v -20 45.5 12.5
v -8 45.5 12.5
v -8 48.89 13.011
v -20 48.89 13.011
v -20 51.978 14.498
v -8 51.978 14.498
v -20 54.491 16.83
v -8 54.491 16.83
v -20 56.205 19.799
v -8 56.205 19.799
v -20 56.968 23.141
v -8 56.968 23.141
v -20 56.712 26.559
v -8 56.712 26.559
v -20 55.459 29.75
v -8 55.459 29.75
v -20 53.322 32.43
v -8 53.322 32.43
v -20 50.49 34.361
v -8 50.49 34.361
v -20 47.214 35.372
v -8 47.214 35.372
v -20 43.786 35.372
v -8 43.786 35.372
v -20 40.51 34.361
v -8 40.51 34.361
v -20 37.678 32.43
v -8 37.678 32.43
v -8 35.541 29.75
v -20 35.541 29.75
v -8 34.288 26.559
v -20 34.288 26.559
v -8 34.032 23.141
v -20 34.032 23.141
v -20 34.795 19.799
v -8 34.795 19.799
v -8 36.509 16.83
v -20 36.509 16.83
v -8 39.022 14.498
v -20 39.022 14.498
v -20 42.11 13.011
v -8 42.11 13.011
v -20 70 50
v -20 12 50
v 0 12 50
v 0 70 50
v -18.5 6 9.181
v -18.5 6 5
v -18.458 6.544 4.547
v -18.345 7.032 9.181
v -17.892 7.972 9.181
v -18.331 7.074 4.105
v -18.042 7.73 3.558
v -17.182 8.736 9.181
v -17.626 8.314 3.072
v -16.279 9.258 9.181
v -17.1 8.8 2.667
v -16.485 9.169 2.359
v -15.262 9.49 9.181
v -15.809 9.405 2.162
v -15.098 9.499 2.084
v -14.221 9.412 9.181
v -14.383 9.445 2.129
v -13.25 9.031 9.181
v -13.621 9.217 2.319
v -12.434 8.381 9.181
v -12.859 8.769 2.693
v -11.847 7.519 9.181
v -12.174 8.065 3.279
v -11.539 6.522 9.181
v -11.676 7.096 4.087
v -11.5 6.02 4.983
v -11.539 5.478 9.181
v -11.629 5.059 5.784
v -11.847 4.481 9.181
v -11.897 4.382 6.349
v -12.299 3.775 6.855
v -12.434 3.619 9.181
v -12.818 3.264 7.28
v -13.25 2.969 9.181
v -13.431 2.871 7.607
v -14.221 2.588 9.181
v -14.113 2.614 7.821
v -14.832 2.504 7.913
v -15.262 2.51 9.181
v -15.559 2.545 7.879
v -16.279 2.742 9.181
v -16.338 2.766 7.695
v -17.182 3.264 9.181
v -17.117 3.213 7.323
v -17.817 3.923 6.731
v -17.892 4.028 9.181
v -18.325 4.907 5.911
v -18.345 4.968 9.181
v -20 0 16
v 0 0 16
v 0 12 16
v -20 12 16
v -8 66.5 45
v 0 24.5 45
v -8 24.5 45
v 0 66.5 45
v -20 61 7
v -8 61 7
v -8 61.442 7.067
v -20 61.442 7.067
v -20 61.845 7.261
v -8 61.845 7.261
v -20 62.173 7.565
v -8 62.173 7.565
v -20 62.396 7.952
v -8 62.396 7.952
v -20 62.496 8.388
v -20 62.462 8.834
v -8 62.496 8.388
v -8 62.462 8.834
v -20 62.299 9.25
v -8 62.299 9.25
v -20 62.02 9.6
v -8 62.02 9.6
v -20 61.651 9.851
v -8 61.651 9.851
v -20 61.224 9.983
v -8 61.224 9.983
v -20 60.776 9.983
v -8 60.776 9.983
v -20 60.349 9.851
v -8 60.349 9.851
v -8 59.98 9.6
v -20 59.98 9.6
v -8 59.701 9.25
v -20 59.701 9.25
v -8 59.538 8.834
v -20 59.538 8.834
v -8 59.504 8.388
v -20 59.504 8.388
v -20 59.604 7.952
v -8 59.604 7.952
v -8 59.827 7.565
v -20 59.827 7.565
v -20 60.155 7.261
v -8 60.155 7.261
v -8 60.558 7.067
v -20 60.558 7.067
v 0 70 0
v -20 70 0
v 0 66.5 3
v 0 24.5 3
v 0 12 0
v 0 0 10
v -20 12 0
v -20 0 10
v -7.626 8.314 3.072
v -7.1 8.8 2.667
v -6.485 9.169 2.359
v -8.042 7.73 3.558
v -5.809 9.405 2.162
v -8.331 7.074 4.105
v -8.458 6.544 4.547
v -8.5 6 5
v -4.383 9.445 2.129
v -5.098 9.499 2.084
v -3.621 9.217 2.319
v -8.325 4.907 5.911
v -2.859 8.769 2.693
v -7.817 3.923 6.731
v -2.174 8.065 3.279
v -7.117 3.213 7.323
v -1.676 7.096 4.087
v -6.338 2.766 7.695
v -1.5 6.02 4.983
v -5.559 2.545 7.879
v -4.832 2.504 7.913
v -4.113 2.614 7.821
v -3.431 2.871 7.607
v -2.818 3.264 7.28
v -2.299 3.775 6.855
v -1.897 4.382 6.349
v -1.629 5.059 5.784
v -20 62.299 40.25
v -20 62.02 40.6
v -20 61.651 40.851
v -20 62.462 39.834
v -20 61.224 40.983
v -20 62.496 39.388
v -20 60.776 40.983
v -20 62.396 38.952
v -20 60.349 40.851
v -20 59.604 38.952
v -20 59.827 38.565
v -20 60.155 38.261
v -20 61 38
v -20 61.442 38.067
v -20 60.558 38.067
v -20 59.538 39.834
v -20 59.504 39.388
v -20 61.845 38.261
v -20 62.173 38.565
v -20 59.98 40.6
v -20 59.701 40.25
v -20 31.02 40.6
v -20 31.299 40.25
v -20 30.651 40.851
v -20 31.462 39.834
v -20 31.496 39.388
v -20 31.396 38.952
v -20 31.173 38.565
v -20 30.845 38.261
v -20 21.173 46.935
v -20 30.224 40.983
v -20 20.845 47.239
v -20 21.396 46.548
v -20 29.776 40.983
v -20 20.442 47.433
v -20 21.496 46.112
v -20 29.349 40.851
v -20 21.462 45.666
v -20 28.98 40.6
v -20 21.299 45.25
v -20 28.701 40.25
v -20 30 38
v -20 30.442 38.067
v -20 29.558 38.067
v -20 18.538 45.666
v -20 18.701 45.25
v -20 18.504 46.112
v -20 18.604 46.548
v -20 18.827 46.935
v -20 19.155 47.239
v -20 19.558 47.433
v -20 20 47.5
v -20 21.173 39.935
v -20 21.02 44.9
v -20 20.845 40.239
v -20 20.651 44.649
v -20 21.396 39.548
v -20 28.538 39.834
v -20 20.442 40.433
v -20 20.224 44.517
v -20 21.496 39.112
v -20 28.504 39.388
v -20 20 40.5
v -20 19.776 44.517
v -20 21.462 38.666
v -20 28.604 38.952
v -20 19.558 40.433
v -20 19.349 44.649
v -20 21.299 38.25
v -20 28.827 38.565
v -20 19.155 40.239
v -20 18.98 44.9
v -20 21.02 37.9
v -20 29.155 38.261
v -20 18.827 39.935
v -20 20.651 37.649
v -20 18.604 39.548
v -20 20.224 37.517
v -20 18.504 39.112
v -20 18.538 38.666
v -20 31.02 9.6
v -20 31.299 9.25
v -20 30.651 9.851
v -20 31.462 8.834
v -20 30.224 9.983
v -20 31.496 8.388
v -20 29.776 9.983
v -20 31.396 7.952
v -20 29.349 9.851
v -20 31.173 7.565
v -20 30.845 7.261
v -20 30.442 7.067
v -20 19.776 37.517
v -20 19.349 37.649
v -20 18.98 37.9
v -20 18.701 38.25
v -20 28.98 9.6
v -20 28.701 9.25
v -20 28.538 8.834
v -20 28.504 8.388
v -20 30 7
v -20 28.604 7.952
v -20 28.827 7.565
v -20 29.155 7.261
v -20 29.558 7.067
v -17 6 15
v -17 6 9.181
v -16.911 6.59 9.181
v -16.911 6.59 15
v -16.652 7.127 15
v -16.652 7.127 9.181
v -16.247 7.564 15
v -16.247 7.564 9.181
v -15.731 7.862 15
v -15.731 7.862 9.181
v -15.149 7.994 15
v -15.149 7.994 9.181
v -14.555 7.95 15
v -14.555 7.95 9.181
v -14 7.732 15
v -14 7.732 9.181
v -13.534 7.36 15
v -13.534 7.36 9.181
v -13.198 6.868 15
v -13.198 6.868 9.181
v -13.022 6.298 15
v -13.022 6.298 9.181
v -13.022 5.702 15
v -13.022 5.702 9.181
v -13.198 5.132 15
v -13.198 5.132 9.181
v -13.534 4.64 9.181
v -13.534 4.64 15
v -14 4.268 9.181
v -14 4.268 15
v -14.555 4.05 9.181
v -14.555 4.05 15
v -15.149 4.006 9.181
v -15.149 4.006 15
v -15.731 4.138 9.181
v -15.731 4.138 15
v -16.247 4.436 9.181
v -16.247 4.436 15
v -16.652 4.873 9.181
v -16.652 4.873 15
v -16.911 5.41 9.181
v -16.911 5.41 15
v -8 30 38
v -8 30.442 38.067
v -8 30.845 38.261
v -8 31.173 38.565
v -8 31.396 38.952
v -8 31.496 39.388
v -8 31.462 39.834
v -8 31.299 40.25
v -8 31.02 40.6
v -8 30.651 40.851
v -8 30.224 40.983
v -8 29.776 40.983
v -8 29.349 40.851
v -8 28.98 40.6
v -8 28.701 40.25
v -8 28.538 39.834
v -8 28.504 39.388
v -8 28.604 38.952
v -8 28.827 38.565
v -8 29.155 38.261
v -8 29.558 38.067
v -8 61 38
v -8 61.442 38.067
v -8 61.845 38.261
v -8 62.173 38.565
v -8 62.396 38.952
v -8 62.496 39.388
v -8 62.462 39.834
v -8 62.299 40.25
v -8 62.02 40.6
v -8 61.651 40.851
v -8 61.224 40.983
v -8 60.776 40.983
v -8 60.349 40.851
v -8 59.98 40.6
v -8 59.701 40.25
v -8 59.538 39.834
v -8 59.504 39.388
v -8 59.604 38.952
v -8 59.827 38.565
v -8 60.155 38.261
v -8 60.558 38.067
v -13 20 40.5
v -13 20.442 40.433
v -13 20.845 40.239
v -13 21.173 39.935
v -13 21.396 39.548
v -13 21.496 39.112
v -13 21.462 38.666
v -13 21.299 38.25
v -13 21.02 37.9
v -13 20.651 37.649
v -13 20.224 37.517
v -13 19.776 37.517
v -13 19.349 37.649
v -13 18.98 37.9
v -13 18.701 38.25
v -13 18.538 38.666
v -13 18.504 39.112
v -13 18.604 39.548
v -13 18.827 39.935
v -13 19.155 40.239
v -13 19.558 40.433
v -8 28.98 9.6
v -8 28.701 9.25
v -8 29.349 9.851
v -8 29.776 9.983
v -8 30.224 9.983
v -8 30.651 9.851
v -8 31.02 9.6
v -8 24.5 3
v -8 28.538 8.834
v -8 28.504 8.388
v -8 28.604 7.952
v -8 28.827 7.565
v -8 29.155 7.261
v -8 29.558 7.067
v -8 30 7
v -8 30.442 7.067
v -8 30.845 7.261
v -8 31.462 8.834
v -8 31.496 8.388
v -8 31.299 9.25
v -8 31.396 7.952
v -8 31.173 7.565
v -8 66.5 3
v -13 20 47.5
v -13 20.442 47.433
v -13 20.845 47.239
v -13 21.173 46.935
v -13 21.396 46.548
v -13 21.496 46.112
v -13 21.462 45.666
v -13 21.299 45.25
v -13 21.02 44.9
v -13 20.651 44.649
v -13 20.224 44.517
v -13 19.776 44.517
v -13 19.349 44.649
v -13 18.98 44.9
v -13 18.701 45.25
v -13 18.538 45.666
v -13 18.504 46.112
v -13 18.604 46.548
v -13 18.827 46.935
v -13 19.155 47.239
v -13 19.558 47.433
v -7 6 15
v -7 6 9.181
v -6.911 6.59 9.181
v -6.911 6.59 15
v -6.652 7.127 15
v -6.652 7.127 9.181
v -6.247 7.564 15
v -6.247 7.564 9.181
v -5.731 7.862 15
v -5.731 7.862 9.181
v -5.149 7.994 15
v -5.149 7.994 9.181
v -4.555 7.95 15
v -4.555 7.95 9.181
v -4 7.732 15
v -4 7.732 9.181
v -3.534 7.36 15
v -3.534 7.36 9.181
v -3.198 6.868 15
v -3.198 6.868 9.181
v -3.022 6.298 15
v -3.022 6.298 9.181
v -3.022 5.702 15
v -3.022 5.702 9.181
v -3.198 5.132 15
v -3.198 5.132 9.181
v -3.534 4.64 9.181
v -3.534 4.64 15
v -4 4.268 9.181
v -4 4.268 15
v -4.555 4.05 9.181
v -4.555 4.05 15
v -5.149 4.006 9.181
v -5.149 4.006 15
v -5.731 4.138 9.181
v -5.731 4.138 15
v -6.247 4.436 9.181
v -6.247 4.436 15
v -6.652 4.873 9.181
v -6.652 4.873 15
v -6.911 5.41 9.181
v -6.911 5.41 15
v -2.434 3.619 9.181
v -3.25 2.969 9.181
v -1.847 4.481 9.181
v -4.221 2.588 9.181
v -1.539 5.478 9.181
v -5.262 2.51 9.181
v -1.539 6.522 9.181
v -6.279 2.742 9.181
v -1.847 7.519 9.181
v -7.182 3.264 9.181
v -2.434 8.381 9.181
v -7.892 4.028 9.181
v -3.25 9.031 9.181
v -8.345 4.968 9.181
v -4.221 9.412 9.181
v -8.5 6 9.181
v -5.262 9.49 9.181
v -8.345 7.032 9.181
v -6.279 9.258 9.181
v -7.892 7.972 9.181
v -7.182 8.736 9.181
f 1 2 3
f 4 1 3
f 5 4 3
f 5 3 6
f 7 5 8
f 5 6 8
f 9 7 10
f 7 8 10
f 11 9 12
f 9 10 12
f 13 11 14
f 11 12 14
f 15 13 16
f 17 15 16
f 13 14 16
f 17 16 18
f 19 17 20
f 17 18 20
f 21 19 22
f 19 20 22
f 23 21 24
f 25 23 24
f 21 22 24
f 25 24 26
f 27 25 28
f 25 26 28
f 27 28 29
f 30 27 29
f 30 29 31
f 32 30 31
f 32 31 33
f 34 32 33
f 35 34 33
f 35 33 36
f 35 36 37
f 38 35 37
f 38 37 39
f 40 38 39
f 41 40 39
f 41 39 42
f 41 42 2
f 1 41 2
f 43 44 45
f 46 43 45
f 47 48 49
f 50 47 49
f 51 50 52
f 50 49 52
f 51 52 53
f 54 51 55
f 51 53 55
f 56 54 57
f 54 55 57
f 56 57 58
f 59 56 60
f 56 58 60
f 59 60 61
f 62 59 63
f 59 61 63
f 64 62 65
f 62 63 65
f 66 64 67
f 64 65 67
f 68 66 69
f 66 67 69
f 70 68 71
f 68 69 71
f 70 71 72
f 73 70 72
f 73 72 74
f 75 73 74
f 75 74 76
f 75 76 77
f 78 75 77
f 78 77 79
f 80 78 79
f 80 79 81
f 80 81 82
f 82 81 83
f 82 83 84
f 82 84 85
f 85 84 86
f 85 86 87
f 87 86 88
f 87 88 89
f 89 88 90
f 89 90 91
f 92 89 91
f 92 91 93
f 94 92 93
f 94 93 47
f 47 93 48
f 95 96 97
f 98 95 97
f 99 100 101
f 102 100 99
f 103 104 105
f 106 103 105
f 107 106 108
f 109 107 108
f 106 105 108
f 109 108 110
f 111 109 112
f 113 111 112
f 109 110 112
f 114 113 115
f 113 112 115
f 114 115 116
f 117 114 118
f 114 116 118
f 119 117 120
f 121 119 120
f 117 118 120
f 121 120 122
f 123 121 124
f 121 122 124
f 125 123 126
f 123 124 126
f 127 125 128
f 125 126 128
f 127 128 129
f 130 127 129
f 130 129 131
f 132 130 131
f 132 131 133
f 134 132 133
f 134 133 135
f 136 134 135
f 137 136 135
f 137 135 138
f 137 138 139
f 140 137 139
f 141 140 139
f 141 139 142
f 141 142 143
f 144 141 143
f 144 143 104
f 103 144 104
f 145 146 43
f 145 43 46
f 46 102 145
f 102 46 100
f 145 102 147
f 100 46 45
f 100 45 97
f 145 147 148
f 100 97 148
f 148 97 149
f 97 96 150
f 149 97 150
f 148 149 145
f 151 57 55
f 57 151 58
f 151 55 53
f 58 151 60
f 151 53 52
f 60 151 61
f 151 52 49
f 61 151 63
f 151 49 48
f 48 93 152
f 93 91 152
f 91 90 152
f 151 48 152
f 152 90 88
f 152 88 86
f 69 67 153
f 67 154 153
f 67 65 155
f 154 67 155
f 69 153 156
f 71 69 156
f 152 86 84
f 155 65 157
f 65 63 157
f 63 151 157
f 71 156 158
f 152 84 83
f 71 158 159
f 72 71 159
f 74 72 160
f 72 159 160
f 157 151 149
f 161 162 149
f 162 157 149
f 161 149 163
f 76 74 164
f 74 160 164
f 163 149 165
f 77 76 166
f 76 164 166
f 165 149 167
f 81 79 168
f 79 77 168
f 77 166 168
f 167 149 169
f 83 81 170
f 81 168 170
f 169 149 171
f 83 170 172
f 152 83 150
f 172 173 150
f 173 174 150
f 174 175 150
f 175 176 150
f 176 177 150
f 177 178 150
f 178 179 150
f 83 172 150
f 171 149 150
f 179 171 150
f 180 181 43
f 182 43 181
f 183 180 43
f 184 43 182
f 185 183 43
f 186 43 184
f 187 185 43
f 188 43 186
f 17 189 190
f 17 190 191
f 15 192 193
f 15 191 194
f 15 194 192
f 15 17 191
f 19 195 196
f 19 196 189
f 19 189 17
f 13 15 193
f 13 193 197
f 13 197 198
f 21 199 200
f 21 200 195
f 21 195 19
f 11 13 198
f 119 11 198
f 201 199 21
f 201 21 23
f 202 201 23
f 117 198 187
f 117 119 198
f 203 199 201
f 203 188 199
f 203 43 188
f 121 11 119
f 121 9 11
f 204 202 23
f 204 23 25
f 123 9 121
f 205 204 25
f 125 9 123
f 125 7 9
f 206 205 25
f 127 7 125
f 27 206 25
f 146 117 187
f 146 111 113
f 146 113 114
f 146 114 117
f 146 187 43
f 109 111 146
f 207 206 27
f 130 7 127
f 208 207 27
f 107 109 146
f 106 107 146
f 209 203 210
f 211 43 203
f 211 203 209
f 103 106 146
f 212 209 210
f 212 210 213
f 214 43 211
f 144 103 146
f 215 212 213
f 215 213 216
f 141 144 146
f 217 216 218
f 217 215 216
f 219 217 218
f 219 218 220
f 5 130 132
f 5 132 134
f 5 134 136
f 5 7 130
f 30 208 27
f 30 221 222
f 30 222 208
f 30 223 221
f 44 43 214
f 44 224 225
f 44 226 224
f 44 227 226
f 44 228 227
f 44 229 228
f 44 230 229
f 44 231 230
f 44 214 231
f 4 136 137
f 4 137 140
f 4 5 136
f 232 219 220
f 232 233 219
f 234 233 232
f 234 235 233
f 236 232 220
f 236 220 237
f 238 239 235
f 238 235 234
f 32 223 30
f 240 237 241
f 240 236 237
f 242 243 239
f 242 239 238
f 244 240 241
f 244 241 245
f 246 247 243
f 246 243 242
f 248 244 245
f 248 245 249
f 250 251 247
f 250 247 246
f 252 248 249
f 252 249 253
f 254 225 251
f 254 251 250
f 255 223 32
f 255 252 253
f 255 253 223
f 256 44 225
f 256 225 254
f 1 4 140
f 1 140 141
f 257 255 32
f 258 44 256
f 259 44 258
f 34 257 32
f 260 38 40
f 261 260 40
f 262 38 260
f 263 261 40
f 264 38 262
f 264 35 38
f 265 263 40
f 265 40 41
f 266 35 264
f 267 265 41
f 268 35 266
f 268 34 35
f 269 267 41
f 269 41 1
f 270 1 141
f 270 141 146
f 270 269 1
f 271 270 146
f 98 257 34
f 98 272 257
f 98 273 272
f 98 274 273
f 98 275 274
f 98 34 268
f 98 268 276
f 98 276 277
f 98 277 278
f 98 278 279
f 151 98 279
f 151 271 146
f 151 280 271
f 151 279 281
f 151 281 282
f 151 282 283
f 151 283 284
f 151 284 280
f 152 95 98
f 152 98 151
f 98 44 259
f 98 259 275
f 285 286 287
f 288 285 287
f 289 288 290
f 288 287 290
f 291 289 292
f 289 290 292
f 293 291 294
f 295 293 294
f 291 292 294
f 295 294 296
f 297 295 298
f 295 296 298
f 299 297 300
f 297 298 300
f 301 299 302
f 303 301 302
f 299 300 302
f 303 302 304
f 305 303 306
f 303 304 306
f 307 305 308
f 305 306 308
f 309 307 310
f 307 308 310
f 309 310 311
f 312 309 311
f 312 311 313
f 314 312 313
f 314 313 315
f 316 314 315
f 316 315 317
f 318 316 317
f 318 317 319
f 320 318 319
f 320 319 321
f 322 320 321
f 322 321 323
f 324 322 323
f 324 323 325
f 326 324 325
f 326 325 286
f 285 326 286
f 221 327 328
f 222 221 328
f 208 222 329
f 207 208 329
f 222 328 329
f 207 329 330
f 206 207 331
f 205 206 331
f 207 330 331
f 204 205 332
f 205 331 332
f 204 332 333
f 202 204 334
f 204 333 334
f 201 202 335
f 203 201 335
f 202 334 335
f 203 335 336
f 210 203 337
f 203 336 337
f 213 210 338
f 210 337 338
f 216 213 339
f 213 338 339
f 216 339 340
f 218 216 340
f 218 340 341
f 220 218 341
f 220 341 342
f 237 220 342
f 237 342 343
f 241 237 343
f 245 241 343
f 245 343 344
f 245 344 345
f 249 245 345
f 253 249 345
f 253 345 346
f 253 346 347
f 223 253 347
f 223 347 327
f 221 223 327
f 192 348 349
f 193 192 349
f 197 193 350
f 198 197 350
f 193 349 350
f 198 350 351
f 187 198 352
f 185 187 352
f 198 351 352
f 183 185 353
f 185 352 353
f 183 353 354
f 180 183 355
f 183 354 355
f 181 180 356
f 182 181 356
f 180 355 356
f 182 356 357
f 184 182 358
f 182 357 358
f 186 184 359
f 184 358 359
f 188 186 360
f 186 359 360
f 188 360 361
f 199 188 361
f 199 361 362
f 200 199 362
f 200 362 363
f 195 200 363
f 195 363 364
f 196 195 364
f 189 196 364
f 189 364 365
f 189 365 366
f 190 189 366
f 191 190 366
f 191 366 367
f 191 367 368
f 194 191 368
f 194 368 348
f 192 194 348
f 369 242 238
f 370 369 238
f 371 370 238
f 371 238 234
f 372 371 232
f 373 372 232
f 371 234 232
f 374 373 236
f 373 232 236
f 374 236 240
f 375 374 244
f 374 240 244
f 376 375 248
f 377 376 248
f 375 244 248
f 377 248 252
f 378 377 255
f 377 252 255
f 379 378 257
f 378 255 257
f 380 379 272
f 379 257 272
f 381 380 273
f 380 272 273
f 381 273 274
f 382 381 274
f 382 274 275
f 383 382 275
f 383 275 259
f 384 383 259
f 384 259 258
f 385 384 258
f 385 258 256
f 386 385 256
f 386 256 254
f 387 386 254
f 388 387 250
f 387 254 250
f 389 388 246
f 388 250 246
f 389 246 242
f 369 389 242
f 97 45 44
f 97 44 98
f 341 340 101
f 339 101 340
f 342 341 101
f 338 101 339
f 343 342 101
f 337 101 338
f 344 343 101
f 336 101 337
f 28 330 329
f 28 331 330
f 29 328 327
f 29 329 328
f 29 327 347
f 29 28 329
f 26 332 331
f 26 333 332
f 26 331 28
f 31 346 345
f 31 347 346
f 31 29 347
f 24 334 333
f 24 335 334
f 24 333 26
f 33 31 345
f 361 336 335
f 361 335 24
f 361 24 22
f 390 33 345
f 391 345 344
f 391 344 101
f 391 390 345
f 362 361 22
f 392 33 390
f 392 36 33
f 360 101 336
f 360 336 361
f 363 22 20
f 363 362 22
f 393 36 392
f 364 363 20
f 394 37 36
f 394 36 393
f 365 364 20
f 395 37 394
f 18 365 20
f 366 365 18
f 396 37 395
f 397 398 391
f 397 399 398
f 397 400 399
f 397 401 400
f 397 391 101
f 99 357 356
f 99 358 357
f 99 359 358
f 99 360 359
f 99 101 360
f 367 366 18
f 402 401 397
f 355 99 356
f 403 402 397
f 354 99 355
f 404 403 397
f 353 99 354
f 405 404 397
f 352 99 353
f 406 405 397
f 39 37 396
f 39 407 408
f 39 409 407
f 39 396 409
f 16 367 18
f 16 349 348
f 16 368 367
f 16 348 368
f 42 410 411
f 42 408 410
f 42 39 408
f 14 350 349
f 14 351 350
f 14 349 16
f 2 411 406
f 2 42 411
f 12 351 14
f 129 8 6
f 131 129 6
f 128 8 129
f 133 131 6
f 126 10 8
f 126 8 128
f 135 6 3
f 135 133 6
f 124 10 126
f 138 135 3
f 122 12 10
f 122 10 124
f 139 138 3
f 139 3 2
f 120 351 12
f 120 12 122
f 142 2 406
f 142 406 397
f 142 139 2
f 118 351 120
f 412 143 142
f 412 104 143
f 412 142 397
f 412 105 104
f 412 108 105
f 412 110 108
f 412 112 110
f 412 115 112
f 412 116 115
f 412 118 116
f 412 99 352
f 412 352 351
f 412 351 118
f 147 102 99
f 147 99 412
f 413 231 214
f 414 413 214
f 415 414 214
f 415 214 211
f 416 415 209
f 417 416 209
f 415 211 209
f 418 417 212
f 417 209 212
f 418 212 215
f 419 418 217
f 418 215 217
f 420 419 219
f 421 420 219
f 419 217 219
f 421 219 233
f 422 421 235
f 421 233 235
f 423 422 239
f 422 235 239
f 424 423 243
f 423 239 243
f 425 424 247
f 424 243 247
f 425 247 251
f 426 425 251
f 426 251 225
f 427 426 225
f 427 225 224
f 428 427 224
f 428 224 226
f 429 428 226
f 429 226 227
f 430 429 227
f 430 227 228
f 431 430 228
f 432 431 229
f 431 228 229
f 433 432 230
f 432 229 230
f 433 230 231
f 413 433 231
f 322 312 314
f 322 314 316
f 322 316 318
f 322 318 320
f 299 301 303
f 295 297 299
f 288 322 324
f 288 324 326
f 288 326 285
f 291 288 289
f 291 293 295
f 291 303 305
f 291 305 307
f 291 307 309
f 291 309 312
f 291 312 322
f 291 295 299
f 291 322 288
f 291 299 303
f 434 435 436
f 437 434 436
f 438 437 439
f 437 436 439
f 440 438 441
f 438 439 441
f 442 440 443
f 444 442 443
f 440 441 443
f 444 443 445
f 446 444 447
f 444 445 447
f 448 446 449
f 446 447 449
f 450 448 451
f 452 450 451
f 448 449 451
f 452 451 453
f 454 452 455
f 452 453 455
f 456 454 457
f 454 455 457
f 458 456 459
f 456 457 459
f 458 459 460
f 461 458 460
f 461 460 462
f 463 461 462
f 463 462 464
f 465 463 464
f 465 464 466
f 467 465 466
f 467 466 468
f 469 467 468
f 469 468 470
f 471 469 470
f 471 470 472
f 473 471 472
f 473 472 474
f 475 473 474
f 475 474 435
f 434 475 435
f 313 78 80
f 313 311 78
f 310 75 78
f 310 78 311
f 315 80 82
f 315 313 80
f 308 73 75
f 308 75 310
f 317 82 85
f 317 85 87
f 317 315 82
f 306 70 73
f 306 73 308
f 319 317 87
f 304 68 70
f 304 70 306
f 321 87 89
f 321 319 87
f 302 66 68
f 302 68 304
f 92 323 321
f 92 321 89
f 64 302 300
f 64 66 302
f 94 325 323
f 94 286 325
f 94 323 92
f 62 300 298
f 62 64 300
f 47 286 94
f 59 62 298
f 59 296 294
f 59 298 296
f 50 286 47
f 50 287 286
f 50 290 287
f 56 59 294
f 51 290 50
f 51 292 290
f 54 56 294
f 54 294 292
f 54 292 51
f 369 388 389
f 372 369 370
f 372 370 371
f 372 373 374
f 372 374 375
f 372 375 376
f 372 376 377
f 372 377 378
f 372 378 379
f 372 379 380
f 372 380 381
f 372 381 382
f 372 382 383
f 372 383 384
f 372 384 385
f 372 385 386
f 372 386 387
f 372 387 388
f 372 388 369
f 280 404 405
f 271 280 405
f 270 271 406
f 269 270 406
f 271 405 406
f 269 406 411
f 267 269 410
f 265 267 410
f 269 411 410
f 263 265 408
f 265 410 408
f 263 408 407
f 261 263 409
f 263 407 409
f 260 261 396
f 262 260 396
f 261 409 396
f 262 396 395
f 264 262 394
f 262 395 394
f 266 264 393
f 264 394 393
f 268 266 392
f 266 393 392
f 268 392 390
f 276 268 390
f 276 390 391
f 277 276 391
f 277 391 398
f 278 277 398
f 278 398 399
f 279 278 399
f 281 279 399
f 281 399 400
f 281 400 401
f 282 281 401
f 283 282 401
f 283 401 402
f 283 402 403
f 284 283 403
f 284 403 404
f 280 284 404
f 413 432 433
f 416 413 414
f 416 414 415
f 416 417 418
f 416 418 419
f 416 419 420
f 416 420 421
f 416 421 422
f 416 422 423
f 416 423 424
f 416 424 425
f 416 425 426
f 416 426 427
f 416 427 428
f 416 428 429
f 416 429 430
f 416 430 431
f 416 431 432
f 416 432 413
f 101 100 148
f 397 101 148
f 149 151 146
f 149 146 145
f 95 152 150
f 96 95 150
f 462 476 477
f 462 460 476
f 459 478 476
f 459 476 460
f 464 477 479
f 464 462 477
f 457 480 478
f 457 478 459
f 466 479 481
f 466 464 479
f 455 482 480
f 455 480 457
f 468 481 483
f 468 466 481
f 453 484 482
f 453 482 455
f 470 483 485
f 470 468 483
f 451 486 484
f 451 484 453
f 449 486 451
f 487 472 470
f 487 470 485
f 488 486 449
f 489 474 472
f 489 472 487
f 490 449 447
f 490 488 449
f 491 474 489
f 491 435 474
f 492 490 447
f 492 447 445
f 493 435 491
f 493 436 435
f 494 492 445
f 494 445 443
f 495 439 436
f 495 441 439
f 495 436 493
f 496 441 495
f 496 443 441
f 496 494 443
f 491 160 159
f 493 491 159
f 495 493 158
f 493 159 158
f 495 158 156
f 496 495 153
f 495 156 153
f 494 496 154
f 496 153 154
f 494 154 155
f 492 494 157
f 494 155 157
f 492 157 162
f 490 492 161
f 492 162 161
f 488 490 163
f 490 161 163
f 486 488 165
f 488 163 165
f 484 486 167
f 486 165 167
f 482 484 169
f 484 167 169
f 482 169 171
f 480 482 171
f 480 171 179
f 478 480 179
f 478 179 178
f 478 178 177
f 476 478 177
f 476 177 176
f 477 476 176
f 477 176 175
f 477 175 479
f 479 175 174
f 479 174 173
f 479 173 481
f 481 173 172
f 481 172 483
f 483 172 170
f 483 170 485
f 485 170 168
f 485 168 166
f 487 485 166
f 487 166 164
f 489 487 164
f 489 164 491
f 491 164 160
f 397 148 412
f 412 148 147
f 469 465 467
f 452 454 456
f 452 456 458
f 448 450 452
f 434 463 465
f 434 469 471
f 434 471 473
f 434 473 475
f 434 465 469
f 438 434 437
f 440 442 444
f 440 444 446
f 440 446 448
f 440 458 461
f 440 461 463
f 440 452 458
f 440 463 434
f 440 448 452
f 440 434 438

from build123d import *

# Parameters (mm, degrees)
SKETCH1_W           = 20
SKETCH1_H           = 50
BOSS_EXTRUDE1_DEPTH = 70
SKETCH2_R           = 1.5
SKETCH2_R_2         = 11.5
CUT_EXTRUDE2_DEPTH  = 60
SKETCH4_W           = 34
SKETCH4_H           = 12
CUT_EXTRUDE3_DEPTH  = 60
SKETCH8_R           = 2
CUT_EXTRUDE5_DEPTH  = 15
SKETCH9_W           = 42
SKETCH9_H           = 42
CUT_EXTRUDE6_DEPTH  = 8
CUT_EXTRUDE8_DEPTH  = 30
SKETCH17_R          = 3.5
CUT_EXTRUDE13_DEPTH = 9.18109305
SKETCH18_R          = 1.5
CUT_EXTRUDE14_DEPTH = 7


with BuildPart() as part:
    # Sketch1 → Boss-Extrude1 (new body)
    with BuildSketch(Plane(origin=(0, 0, 0), x_dir=(1, 0, 0), z_dir=(0, 1, 0))):
        with Locations((-10, -25)):
            Rectangle(SKETCH1_W, SKETCH1_H)
    extrude(amount=BOSS_EXTRUDE1_DEPTH)

    # Sketch2 → Cut-Extrude2 (cut)
    with BuildSketch(Plane(origin=(0, 0, 0), x_dir=(0, 0, -1), z_dir=(1, 0, 0))):
        with Locations((-8.5, 61)):
            Circle(SKETCH2_R)
        with Locations((-24, 45.5)):
            Circle(SKETCH2_R_2)
        with Locations((-8.5, 30)):
            Circle(SKETCH2_R)
        with Locations((-39.5, 30)):
            Circle(SKETCH2_R)
        with Locations((-39.5, 61)):
            Circle(SKETCH2_R)
    extrude(amount=-CUT_EXTRUDE2_DEPTH, mode=Mode.SUBTRACT)

    # Sketch4 → Cut-Extrude3 (cut)
    with BuildSketch(Plane(origin=(0, 0, 0), x_dir=(0, 0, -1), z_dir=(1, 0, 0))):
        with Locations((-33, 6)):
            Rectangle(SKETCH4_W, SKETCH4_H)
    extrude(amount=-CUT_EXTRUDE3_DEPTH, mode=Mode.SUBTRACT)

    # Sketch8 → Cut-Extrude5 (cut)
    with BuildSketch(Plane(origin=(0, 0, 0), x_dir=(-1, 0, 0), z_dir=(0, 0, -1))):
        with Locations((15, 6)):
            Circle(SKETCH8_R)
        with Locations((5, 6)):
            Circle(SKETCH8_R)
    extrude(amount=-CUT_EXTRUDE5_DEPTH, mode=Mode.SUBTRACT)

    # Sketch9 → Cut-Extrude6 (cut)
    with BuildSketch(Plane(origin=(0, 0, 0), x_dir=(0, 0, -1), z_dir=(1, 0, 0))):
        with Locations((-24, 45.5)):
            Rectangle(SKETCH9_W, SKETCH9_H)
    extrude(amount=-CUT_EXTRUDE6_DEPTH, mode=Mode.SUBTRACT)

    # Sketch11 → Cut-Extrude8 (cut)
    with BuildSketch(Plane(origin=(0, 0, 0), x_dir=(0, 0, -1), z_dir=(1, 0, 0))):
        Polygon((-10, 0), (0, 0), (0, 12), align=None)
    extrude(amount=-CUT_EXTRUDE8_DEPTH, mode=Mode.SUBTRACT)

    # Sketch17 → Cut-Extrude13 (cut)
    with BuildSketch(Plane(origin=(0, 0, 0), x_dir=(-1, 0, 0), z_dir=(0, 0, -1))):
        with Locations((15, 6)):
            Circle(SKETCH17_R)
        with Locations((5, 6)):
            Circle(SKETCH17_R)
    extrude(amount=-CUT_EXTRUDE13_DEPTH, mode=Mode.SUBTRACT)

    # Sketch18 → Cut-Extrude14 (cut)
    with BuildSketch(Plane.ZY.offset(20)):
        with Locations((46, 20)):
            Circle(SKETCH18_R)
        with Locations((39, 20)):
            Circle(SKETCH18_R)
    extrude(amount=-CUT_EXTRUDE14_DEPTH, mode=Mode.SUBTRACT)


solid = part.part
